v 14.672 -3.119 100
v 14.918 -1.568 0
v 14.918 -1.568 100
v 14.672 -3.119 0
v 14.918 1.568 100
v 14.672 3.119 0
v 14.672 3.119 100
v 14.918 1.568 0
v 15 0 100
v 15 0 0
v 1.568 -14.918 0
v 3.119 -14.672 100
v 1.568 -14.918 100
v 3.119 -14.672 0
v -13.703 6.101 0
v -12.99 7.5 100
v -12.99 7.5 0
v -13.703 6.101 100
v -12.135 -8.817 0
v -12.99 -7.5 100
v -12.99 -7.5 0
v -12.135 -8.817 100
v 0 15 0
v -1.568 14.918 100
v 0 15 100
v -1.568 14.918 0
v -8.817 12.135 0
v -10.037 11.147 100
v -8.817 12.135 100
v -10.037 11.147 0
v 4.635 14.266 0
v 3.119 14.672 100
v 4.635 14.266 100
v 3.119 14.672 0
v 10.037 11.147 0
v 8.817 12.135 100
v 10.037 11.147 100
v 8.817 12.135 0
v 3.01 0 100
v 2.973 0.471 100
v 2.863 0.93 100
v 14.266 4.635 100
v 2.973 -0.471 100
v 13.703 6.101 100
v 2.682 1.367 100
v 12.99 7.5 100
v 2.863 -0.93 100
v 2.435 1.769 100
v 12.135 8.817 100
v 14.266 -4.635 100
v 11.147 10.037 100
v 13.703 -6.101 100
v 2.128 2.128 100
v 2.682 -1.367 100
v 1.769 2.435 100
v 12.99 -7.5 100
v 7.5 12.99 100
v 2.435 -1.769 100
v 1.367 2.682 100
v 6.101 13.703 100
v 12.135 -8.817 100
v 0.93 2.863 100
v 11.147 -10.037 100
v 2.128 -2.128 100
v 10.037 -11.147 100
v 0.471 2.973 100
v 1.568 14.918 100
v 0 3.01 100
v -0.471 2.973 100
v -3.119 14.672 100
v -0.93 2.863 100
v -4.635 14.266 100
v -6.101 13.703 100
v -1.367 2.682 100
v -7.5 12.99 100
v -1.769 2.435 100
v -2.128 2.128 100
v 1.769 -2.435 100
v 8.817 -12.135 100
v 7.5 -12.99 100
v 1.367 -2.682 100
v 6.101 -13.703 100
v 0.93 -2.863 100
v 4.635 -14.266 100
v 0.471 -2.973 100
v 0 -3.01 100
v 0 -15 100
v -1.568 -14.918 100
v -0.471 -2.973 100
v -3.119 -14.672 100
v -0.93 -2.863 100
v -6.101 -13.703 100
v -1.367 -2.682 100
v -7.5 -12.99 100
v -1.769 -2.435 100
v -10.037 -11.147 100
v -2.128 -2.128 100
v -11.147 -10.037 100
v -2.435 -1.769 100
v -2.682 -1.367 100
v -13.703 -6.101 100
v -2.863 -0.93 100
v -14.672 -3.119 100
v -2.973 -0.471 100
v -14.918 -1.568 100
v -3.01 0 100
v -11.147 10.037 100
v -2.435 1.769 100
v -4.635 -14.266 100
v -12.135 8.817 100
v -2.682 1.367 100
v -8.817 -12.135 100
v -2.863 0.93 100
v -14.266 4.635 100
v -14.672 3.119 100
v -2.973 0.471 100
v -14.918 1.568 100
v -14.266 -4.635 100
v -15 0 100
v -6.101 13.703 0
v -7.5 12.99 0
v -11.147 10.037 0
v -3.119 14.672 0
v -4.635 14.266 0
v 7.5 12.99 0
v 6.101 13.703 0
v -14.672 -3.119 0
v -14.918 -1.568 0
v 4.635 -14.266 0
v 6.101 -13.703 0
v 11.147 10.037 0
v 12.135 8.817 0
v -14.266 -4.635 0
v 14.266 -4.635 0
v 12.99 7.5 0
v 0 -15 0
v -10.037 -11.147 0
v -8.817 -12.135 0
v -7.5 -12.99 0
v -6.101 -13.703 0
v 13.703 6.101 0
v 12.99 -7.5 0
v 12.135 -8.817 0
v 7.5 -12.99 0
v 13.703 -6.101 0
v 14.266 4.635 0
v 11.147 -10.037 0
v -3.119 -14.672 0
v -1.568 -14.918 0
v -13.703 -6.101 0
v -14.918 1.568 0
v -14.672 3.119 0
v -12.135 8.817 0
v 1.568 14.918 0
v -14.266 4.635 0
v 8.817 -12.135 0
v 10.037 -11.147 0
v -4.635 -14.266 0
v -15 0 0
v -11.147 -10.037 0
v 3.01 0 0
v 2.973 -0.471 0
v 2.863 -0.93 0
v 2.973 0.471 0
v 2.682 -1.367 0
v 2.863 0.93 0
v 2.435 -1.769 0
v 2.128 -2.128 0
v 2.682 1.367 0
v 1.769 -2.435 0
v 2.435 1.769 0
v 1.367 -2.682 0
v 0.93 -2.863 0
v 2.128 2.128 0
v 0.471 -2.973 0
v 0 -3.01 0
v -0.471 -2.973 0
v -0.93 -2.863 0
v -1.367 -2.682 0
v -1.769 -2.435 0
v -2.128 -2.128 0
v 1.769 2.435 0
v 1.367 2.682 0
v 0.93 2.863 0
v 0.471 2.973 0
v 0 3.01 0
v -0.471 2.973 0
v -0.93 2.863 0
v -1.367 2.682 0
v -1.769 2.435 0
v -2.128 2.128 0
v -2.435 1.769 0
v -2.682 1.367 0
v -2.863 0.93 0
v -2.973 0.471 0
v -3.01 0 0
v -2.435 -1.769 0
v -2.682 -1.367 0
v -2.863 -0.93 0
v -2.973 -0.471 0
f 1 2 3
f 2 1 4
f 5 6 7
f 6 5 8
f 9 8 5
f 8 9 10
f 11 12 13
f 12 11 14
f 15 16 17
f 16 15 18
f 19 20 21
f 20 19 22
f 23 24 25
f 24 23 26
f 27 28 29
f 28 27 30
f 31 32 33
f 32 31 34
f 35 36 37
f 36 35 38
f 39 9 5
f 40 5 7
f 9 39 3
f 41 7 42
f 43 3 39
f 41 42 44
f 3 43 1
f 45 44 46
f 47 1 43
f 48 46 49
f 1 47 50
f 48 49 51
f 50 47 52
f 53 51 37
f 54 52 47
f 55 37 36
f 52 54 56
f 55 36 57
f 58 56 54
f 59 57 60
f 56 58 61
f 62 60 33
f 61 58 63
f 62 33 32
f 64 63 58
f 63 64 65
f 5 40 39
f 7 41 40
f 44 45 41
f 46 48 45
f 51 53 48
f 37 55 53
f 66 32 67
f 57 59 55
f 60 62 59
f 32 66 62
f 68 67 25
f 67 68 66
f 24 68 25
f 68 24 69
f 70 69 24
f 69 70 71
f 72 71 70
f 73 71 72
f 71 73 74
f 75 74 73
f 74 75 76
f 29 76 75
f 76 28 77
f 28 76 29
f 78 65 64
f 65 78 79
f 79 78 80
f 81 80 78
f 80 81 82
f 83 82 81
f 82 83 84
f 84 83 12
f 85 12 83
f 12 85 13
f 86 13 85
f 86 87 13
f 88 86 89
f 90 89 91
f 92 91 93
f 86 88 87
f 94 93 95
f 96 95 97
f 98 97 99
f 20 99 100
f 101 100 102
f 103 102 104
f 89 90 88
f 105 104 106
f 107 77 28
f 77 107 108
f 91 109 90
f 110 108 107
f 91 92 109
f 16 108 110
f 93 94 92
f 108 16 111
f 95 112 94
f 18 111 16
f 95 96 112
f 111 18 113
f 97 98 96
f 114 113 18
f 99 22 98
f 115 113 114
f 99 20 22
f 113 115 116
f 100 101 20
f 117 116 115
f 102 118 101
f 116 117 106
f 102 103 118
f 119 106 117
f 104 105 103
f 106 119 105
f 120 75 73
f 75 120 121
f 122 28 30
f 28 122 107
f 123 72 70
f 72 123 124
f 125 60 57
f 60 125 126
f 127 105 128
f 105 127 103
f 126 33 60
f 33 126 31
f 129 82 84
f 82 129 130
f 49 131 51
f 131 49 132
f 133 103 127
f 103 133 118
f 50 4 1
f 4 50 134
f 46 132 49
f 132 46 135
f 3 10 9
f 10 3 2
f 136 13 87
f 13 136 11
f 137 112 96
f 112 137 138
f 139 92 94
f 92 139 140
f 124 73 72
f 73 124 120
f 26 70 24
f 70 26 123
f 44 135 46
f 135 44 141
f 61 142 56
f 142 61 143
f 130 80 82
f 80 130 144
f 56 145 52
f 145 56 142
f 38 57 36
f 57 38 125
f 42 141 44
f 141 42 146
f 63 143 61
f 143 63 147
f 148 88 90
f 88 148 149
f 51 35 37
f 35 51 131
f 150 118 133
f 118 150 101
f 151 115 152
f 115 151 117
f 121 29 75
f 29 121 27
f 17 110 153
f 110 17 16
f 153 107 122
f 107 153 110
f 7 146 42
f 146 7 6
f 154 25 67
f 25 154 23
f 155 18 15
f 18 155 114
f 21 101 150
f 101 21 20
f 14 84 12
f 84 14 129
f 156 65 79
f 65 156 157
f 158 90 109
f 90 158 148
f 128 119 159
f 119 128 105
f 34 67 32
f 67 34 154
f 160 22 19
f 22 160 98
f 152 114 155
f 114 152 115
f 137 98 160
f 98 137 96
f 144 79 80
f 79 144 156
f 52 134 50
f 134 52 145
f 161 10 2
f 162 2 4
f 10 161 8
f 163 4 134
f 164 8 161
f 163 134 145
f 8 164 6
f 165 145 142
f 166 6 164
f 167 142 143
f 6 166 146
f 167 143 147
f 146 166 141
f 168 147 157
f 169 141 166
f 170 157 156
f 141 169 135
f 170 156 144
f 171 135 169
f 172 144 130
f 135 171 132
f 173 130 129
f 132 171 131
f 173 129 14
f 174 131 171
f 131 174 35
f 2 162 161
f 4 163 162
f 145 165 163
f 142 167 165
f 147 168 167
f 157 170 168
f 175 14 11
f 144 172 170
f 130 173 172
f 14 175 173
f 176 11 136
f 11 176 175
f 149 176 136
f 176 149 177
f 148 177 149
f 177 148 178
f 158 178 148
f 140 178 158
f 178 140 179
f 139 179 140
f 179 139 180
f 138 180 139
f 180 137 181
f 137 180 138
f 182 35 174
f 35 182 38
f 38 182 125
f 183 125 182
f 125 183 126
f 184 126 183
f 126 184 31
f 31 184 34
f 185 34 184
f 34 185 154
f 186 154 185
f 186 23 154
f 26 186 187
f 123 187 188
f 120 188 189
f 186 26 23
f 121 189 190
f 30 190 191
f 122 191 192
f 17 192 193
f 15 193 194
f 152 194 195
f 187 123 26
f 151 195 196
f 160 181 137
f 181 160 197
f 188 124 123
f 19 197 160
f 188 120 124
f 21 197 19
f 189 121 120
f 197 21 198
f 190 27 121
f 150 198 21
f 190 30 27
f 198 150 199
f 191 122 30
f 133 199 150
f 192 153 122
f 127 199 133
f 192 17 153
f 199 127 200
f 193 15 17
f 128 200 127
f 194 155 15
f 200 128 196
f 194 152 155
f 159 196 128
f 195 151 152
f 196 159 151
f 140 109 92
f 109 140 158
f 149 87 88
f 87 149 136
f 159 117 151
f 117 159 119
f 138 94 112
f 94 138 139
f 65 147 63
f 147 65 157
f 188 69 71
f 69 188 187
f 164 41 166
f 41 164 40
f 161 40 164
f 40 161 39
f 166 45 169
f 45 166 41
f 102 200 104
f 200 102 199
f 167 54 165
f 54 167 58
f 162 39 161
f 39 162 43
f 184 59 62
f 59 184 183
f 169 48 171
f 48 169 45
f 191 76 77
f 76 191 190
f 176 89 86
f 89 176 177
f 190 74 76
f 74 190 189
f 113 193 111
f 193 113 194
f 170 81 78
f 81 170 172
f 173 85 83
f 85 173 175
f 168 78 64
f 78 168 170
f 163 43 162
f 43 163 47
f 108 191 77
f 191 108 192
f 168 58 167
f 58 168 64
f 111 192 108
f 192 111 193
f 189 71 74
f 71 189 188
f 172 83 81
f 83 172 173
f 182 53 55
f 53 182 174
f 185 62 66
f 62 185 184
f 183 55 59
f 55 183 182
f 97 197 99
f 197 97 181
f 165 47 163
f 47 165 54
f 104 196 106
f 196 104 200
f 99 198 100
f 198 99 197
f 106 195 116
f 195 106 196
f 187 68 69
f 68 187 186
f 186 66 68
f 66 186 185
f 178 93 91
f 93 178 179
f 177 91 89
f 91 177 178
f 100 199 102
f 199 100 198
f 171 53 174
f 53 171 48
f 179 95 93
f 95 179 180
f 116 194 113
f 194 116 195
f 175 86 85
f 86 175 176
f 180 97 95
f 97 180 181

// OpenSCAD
        // Generation: 4 | Session: test-env-id
        wall_thickness = 2.5999999999999996;
        bore_clearance = 1.0100000000000002;
        roller_radius = 15.0;
        
        module roller() {
            difference() {
                cylinder(h=100, r=roller_radius, $fn=60);
                translate([0,0,-5])
                    cylinder(h=110, r=bore_clearance + 2, $fn=40);
            }
        }
        roller();
        
